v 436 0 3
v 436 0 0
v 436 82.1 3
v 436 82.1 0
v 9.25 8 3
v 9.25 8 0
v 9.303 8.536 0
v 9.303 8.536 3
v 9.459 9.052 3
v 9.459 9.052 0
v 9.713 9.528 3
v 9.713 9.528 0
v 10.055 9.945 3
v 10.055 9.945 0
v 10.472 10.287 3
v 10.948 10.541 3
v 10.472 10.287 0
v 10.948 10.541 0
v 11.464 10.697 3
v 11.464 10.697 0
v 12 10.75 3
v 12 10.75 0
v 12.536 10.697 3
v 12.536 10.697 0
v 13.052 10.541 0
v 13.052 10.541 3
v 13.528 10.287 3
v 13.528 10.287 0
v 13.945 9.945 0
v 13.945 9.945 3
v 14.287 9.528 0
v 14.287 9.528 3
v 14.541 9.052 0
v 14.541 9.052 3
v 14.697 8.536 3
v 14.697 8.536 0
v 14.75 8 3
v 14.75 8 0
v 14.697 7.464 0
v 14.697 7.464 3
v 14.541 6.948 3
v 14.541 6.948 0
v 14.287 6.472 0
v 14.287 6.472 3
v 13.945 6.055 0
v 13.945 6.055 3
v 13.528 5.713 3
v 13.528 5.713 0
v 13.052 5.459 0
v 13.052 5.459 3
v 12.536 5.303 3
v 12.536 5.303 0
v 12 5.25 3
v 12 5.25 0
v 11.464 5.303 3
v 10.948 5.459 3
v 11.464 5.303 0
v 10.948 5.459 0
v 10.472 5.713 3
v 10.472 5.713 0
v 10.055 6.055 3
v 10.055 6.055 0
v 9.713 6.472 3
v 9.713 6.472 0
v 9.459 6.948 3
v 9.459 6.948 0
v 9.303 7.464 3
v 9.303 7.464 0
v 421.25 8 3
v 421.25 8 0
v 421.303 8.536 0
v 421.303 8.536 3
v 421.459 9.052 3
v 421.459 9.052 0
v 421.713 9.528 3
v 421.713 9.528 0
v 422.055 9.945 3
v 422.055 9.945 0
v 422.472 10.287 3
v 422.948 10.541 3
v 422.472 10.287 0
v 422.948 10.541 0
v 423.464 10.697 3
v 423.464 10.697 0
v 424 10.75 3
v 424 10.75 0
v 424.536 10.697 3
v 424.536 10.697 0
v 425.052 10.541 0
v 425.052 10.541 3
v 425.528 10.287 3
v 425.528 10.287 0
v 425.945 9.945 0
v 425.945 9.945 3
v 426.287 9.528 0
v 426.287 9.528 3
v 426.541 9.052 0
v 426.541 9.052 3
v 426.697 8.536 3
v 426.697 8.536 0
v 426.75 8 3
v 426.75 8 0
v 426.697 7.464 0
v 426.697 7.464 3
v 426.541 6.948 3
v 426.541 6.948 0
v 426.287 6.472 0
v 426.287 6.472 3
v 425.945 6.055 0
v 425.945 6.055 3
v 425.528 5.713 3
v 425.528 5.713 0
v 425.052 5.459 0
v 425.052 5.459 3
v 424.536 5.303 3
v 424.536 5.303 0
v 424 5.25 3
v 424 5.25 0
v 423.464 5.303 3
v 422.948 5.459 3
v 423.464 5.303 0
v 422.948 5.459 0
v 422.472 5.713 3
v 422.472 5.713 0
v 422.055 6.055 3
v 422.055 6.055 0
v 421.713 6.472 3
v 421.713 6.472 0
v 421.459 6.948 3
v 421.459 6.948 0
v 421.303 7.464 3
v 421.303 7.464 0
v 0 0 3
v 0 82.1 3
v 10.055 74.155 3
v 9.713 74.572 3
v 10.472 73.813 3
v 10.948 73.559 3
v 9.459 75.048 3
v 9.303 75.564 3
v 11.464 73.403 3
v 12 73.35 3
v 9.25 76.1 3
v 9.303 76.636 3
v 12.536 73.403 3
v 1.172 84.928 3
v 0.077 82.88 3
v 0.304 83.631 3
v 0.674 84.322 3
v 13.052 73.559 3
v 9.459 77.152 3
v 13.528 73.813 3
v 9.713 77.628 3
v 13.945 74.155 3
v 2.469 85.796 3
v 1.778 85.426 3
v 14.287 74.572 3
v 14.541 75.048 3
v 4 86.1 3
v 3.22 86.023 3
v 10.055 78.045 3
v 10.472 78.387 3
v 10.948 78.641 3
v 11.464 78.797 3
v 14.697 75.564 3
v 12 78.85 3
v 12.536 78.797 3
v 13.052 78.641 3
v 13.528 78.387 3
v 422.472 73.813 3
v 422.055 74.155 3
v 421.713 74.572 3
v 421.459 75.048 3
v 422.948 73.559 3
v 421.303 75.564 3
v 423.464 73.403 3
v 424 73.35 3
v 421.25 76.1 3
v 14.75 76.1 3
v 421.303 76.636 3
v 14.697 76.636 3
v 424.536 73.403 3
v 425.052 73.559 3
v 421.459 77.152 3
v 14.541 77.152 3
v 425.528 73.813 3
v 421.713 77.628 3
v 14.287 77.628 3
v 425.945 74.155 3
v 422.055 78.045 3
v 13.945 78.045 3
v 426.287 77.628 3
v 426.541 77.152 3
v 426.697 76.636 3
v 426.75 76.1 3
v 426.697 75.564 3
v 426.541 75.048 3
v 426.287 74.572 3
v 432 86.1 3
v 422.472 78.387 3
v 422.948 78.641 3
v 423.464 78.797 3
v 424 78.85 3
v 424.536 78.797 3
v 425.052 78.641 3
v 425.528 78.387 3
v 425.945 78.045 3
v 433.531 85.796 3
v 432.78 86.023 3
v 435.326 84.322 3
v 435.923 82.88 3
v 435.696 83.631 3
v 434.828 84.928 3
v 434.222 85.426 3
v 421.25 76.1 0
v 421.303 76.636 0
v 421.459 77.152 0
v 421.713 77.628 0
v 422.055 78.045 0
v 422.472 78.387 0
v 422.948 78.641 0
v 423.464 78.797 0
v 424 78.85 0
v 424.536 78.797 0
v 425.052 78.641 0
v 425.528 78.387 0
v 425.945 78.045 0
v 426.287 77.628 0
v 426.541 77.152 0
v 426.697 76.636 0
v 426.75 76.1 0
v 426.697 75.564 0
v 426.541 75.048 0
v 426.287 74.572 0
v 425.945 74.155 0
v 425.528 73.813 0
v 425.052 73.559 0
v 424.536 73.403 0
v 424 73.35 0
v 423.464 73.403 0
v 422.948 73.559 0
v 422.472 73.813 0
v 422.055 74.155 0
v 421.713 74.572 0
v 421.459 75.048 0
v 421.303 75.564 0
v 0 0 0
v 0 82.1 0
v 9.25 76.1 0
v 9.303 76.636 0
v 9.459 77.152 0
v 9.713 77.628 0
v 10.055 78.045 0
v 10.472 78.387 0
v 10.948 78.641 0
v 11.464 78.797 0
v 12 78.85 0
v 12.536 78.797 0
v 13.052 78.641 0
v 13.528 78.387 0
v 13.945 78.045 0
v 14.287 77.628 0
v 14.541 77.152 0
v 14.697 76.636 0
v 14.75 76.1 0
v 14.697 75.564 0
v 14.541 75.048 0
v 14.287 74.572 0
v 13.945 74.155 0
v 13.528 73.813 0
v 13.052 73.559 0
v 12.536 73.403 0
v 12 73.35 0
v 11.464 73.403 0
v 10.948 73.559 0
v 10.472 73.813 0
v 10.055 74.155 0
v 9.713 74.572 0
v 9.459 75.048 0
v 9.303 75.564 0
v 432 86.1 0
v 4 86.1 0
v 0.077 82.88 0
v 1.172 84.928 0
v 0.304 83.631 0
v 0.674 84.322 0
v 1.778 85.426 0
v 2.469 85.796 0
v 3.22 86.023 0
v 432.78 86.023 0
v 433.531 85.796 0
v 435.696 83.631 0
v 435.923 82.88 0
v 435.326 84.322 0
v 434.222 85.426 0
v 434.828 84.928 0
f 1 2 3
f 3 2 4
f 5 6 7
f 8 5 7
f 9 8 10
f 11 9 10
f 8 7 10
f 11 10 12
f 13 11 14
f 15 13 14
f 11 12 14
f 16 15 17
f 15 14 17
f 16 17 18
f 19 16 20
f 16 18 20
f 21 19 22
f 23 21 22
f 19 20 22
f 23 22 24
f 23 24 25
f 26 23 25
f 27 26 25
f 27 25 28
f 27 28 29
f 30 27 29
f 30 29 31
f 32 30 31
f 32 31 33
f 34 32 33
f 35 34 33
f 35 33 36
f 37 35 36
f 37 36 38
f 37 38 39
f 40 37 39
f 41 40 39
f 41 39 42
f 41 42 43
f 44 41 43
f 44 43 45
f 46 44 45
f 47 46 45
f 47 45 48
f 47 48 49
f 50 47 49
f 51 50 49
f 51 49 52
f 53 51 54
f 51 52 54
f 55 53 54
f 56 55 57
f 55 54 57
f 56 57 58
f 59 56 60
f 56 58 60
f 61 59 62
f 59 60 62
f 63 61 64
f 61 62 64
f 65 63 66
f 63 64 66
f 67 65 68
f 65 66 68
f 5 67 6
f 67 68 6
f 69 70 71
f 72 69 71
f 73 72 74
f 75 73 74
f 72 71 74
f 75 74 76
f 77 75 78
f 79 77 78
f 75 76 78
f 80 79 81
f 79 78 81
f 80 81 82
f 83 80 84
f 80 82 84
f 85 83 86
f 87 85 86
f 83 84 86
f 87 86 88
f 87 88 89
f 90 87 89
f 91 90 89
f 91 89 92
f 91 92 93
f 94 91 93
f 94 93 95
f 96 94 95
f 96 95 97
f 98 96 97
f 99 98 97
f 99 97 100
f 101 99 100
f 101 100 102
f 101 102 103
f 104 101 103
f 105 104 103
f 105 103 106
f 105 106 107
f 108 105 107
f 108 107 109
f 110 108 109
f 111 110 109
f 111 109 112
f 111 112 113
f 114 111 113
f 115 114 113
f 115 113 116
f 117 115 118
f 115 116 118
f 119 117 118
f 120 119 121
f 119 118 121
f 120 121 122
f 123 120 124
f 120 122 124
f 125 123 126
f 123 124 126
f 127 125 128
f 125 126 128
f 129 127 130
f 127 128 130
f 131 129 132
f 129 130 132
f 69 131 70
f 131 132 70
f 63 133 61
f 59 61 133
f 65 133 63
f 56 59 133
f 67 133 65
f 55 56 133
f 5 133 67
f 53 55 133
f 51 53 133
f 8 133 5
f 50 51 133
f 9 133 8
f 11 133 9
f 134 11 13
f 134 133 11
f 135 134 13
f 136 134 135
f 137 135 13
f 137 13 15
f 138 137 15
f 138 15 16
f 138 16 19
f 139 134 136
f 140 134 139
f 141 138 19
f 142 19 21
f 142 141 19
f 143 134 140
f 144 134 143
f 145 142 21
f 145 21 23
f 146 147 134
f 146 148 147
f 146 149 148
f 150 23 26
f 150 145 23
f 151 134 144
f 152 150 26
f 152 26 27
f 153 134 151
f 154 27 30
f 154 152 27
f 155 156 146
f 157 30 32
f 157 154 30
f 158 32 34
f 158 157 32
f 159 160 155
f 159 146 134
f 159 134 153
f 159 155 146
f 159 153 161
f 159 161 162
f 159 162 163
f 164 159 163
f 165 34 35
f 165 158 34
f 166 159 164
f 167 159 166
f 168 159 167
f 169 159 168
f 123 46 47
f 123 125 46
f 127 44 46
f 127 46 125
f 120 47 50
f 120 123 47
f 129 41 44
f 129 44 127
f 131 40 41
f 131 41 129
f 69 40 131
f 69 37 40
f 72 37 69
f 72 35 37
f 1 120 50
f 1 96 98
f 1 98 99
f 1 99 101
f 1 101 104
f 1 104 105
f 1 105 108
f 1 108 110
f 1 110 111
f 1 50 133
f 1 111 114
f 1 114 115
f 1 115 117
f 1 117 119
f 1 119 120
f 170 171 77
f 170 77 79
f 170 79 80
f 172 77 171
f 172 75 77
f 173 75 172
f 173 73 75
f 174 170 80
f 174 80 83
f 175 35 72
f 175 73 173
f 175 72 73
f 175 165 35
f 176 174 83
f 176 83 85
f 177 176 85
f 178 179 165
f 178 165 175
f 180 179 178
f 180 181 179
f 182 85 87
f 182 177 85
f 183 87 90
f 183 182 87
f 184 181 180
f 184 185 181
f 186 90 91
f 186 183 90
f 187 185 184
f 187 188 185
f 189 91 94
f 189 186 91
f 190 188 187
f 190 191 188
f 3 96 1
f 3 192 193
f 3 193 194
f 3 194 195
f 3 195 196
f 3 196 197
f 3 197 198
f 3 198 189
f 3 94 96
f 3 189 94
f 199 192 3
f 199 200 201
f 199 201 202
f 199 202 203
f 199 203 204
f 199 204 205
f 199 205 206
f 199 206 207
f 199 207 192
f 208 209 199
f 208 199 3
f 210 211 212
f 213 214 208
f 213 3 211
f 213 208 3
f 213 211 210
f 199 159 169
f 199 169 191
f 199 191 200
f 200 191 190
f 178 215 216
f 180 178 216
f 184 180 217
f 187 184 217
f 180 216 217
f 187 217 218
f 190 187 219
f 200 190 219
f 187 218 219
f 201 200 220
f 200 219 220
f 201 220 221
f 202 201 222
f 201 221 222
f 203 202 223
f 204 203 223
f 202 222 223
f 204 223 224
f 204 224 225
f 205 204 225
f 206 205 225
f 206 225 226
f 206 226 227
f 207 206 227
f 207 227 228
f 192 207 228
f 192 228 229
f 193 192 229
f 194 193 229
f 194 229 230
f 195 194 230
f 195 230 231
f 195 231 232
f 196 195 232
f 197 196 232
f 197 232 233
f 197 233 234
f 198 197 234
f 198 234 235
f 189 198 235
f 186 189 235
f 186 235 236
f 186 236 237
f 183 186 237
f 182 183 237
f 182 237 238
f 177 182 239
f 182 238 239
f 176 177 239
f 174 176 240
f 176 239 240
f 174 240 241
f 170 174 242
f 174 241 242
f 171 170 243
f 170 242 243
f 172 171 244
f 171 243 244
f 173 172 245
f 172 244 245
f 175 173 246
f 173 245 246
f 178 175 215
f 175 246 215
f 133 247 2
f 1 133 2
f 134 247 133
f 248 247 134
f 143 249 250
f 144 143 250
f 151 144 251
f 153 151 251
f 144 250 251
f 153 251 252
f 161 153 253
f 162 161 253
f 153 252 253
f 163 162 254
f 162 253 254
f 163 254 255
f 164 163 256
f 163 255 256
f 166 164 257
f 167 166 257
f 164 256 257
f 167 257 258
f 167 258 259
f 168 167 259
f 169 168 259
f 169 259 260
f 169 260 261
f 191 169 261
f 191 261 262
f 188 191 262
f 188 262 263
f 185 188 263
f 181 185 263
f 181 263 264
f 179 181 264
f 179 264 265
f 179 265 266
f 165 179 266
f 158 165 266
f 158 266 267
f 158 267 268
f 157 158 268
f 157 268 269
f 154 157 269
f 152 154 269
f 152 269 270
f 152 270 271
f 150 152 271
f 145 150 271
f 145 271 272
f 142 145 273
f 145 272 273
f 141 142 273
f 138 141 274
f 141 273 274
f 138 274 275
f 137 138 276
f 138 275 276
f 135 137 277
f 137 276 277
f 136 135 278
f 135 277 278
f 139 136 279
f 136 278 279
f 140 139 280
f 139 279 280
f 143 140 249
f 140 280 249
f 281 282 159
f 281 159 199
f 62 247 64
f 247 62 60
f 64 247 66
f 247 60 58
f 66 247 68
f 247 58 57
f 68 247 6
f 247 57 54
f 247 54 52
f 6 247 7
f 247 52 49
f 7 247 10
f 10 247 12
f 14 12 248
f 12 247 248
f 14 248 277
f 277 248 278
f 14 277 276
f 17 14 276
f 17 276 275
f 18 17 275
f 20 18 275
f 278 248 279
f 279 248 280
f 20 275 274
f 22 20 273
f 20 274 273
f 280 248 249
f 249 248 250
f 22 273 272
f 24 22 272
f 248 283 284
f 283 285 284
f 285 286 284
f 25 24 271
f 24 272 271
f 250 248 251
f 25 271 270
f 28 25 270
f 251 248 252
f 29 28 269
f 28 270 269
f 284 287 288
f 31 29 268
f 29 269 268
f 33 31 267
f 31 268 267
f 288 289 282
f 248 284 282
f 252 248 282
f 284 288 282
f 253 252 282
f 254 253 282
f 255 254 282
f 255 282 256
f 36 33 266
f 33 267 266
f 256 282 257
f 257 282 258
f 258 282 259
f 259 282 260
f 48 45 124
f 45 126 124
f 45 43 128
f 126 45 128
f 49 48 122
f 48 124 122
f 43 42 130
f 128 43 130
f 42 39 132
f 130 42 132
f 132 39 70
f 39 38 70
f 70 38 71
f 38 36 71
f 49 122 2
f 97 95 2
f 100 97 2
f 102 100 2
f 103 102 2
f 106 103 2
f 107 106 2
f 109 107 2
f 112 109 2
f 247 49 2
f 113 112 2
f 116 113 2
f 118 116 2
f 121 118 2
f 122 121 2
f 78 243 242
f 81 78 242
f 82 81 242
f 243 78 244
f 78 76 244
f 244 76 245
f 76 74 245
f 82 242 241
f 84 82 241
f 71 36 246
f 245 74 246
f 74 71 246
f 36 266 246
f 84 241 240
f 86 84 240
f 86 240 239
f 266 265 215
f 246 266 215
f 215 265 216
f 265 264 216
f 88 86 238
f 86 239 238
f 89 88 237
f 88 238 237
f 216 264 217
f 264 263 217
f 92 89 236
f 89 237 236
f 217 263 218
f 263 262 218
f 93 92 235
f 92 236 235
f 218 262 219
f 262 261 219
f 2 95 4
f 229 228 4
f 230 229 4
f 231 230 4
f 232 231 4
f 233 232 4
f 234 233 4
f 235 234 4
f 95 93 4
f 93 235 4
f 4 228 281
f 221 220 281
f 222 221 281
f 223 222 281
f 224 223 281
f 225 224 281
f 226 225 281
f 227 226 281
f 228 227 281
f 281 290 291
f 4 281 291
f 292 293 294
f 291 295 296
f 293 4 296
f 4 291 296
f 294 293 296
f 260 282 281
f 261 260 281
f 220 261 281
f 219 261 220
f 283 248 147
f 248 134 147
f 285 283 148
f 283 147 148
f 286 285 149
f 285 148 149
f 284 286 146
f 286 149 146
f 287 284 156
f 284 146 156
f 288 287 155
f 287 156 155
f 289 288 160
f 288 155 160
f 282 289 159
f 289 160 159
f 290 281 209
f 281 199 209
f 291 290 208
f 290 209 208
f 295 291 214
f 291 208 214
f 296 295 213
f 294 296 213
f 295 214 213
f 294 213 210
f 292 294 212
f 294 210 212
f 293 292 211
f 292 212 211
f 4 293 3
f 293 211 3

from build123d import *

# Parameters (mm, degrees)
SKETCH_1_W          = 436
SKETCH_1_H          = 86.1
EXTRUDE_1_DEPTH     = 3
SKETCH_6_R          = 2.75
CUT_EXTRUDE_1_DEPTH = 445.430208244
FILLET_1_R          = 4


with BuildPart() as part:
    # Эскиз1 → Бобышка-Вытянуть1 (new body)
    with BuildSketch(Plane.XY):
        with Locations((218, 43.05)):
            Rectangle(SKETCH_1_W, SKETCH_1_H)
    extrude(amount=EXTRUDE_1_DEPTH)

    # Эскиз6 → Вырез-Вытянуть1 (cut, through all)
    with BuildSketch(Plane(origin=(0, 0, 0), x_dir=(-1, 0, 0), z_dir=(0, 0, -1))):
        with Locations((-424, 76.1)):
            Circle(SKETCH_6_R)
        with Locations((-424, 8)):
            Circle(SKETCH_6_R)
        with Locations((-12, 8)):
            Circle(SKETCH_6_R)
        with Locations((-12, 76.1)):
            Circle(SKETCH_6_R)
    extrude(amount=-CUT_EXTRUDE_1_DEPTH, mode=Mode.SUBTRACT)

    # Скругление1
    fillet_1_edges = [part.edges().sort_by_distance(p)[0] for p in [
        (0, 86.1, 1.5),
        (436, 86.1, 1.5),
    ]]
    fillet(fillet_1_edges, radius=FILLET_1_R)


solid = part.part
